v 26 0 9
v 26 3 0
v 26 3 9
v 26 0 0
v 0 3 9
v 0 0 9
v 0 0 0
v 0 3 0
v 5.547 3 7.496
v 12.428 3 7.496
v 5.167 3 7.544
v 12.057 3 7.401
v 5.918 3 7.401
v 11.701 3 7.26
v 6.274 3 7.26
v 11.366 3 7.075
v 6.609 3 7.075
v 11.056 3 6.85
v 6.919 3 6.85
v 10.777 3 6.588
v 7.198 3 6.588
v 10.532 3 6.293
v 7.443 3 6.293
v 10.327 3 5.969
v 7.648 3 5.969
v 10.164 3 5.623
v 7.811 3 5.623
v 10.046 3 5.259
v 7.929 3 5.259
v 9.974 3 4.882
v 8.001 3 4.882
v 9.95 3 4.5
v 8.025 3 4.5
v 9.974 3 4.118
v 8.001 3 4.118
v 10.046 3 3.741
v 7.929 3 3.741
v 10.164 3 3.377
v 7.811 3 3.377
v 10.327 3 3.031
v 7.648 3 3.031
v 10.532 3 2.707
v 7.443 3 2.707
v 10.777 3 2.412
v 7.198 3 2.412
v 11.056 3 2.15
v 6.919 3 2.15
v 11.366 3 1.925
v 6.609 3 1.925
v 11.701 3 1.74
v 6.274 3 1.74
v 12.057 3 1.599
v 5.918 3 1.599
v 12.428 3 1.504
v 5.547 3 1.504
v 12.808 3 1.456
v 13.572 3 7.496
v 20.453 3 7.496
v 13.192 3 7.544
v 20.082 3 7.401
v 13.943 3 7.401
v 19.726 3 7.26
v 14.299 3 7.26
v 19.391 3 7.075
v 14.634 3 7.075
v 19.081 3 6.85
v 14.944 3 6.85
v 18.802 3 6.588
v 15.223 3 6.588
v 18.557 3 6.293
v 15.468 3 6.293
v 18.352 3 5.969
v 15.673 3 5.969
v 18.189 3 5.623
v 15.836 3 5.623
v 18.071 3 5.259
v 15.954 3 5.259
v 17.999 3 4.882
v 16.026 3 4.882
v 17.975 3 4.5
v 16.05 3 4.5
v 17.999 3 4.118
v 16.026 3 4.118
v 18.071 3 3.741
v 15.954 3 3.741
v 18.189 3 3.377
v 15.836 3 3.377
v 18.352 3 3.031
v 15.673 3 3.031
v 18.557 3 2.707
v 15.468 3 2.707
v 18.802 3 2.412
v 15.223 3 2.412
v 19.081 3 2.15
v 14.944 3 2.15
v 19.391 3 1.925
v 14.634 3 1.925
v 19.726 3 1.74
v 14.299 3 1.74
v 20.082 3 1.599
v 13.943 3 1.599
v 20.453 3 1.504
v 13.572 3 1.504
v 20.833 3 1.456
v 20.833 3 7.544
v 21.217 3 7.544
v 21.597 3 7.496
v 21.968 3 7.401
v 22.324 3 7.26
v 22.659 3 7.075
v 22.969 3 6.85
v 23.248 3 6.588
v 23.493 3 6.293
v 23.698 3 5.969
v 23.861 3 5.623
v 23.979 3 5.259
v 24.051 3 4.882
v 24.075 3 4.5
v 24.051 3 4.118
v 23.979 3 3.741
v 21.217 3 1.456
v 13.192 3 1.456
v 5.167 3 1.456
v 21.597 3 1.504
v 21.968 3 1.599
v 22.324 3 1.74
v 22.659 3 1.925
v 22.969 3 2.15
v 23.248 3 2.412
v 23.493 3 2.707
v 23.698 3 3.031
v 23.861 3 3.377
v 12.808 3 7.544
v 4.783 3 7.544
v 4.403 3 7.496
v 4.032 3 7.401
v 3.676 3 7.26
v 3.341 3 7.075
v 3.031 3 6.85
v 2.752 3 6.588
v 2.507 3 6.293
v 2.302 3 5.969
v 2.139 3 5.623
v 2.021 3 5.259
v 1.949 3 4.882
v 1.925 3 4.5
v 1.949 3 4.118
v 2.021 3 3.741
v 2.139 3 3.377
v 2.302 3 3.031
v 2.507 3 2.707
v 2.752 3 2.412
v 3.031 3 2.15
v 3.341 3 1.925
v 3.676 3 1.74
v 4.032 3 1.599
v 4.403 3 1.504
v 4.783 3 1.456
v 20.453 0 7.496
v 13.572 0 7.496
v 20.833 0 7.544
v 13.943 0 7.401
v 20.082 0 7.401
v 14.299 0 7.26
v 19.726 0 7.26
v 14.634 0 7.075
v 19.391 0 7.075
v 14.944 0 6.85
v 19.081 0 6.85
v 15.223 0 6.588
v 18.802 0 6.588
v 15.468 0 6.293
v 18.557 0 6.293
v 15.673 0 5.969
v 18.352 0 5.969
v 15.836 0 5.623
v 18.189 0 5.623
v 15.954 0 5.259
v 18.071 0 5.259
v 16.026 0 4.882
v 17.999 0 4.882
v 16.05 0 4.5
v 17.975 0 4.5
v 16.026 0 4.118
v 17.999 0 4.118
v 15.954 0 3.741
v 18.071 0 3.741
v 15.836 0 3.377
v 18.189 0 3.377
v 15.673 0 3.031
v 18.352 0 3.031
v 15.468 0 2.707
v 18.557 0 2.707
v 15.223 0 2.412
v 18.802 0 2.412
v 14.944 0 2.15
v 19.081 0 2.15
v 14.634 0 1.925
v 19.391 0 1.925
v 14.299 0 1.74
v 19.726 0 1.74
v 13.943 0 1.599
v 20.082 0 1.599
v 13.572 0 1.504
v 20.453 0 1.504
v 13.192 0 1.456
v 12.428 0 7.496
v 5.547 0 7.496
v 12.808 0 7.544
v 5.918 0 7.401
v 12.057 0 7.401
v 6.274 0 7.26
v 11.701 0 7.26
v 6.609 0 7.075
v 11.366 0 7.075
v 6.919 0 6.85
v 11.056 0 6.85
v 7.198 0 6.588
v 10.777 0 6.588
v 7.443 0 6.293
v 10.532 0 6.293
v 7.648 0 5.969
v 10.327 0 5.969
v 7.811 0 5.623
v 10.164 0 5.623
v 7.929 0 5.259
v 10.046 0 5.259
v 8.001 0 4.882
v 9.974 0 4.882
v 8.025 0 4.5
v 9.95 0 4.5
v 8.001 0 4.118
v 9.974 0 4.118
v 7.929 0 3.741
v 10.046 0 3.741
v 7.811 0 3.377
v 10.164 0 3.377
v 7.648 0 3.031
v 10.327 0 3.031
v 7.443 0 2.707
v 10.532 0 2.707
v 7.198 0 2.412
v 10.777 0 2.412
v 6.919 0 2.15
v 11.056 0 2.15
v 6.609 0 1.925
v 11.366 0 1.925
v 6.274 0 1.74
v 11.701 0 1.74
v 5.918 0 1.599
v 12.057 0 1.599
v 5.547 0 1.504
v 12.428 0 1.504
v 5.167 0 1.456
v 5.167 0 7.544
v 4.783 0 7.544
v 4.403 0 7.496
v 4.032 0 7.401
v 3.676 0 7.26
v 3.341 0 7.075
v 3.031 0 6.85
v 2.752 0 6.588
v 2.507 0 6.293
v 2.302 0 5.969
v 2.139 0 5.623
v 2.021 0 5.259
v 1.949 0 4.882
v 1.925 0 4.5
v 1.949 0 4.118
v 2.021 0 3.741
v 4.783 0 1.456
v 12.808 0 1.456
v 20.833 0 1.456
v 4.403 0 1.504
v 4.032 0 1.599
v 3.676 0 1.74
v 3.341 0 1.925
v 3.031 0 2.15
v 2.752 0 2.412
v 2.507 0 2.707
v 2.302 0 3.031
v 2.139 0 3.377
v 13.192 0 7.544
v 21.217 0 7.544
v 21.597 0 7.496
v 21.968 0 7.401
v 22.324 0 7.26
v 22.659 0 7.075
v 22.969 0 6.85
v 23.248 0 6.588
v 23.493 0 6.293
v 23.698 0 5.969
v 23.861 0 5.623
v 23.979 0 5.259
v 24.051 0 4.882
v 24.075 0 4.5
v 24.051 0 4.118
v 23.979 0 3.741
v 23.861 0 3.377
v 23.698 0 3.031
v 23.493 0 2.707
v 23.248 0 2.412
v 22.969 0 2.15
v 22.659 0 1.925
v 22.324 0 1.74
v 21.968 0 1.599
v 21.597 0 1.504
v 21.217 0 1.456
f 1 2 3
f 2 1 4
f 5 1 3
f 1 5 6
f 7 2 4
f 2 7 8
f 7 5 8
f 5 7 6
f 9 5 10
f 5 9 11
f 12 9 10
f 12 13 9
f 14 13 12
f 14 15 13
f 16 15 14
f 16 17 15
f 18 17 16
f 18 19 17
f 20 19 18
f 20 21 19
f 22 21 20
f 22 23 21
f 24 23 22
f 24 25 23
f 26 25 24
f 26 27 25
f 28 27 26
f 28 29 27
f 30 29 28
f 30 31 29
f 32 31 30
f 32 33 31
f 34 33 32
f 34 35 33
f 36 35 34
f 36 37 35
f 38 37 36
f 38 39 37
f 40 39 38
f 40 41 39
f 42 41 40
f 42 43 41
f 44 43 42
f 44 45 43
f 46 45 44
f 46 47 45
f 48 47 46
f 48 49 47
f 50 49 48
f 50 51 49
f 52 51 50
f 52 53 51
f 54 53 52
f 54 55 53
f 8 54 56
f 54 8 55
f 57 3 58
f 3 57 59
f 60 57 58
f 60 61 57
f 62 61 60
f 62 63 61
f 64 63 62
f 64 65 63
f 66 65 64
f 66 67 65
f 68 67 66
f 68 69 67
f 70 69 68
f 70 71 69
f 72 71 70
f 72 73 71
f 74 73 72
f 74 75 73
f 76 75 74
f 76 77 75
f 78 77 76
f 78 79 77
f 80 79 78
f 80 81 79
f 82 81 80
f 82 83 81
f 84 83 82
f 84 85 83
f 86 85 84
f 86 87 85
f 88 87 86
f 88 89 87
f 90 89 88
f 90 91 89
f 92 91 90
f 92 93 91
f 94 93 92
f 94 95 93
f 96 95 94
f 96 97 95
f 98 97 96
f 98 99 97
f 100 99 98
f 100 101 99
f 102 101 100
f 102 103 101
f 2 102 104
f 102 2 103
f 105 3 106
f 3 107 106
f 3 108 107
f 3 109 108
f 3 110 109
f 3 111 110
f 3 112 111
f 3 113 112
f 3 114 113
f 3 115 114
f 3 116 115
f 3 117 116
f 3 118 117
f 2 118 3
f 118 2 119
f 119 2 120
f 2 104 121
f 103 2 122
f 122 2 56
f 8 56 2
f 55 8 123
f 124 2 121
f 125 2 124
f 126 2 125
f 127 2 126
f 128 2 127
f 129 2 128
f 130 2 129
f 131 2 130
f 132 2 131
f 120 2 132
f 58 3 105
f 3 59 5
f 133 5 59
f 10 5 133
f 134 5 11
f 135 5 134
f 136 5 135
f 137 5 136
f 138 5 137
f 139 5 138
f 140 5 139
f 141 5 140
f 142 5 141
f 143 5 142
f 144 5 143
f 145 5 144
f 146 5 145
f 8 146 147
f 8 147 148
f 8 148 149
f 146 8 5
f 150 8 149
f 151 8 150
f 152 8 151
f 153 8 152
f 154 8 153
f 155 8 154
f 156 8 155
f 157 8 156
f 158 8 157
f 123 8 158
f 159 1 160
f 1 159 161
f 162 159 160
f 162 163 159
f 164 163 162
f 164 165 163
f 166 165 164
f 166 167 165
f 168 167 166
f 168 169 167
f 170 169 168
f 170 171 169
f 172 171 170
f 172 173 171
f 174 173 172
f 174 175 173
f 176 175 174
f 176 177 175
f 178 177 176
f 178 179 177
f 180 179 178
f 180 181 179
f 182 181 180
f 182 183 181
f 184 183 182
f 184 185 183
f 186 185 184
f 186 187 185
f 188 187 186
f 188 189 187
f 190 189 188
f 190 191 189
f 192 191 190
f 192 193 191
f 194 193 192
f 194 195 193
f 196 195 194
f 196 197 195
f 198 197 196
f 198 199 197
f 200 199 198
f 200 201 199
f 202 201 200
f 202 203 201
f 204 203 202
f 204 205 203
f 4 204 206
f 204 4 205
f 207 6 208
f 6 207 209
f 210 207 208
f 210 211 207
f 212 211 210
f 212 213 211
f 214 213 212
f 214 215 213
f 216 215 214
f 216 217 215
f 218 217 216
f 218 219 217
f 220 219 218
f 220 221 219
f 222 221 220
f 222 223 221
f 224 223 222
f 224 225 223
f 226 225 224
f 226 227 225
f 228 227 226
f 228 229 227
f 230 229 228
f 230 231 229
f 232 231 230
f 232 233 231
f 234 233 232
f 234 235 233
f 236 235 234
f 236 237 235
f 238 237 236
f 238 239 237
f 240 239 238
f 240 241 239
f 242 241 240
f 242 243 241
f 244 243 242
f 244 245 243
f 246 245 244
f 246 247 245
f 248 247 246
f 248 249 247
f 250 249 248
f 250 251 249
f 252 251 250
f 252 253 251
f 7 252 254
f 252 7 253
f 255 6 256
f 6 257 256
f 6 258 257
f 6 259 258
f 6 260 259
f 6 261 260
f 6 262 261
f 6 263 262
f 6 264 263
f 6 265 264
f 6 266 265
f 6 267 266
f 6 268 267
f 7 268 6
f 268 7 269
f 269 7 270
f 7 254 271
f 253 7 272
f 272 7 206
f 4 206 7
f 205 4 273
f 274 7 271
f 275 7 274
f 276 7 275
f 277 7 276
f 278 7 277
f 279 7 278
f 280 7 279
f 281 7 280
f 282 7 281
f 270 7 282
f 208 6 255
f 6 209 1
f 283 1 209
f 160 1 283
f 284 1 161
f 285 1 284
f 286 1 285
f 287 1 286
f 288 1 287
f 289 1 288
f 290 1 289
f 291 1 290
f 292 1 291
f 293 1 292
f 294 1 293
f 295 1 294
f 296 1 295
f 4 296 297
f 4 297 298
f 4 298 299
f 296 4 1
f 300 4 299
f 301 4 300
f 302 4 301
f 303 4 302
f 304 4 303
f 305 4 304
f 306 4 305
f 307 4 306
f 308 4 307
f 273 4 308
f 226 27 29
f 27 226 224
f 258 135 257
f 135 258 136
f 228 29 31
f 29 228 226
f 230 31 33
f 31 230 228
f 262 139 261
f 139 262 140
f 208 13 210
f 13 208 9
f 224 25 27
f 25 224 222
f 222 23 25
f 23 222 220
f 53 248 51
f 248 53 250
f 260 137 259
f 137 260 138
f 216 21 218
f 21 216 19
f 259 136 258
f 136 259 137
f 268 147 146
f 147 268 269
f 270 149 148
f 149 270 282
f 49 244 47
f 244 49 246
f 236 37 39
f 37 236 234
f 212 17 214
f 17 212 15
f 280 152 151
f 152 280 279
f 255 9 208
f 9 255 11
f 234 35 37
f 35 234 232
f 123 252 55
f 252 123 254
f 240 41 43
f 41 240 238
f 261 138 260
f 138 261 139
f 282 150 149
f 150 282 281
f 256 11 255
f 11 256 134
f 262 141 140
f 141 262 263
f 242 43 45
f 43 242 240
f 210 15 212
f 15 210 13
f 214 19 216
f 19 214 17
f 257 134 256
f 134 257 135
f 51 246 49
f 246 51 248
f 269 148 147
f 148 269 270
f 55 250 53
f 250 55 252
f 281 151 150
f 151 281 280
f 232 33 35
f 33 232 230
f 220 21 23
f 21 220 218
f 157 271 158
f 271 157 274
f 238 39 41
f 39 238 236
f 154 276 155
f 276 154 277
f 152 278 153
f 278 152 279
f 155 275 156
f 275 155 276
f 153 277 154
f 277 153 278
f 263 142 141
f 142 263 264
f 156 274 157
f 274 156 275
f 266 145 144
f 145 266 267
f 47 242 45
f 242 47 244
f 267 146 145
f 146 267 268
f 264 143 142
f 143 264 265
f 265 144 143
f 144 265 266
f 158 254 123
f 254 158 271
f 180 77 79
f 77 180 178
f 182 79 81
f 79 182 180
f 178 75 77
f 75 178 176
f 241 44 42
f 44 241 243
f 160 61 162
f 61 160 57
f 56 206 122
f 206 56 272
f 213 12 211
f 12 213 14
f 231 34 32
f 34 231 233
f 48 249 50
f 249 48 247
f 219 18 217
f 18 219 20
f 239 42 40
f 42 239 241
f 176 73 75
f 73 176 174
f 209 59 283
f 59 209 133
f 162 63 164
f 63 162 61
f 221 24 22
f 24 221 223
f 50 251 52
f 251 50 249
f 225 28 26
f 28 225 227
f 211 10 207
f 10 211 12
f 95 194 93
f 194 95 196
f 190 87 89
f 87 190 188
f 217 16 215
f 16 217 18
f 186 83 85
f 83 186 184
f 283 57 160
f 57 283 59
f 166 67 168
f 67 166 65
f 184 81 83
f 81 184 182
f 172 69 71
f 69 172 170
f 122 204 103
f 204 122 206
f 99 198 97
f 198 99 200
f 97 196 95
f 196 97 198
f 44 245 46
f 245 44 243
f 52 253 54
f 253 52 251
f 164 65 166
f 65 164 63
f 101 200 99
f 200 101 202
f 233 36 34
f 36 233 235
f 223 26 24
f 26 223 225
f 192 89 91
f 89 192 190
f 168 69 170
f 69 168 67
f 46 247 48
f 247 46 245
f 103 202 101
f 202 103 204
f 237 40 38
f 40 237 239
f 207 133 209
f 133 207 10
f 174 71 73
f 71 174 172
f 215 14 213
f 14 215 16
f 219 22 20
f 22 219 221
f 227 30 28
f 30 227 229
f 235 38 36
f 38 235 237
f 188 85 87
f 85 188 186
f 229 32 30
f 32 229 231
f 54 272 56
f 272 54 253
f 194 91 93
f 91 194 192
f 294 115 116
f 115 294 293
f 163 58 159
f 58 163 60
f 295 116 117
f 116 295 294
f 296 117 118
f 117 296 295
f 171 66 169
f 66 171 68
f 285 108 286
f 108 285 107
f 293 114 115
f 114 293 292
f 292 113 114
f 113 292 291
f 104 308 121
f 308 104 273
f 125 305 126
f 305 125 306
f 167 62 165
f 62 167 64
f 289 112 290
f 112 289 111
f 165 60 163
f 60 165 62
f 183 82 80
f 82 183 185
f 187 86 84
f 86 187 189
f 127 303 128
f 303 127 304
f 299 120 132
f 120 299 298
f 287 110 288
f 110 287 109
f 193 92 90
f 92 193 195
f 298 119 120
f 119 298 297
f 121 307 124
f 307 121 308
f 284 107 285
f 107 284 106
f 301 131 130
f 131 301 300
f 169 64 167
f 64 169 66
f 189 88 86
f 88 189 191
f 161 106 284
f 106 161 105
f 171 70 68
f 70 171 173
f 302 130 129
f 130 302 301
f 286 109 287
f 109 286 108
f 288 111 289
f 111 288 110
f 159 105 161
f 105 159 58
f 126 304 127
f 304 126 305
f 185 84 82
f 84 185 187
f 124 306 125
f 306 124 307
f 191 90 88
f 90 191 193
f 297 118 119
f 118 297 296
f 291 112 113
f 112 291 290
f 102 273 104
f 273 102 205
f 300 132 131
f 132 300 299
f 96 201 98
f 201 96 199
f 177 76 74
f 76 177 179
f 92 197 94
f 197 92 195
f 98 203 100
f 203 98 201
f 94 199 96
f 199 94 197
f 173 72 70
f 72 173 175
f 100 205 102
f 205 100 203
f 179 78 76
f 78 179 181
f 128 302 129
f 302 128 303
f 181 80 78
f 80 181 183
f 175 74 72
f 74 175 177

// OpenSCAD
TiefeWerkstueck = 3;
BreitePfote = 26;
DurchmesserDioden = 6.1;
HoeheWerkstueck = 9;
loecher = 3;
AbstandLoecher = (BreitePfote-loecher*DurchmesserDioden)/(loecher+1);

function Abstand(n) = (n+1)*AbstandLoecher+n*DurchmesserDioden;

difference(){
    cube([BreitePfote,TiefeWerkstueck,HoeheWerkstueck]);
    translate([Abstand(0),0,0]){
        cylinder1();
    }
    translate([Abstand(1),0,0]){
        cylinder1();
    }
    translate([Abstand(2),0,0]){
        cylinder1();
    }

}

module cylinder1() {
translate([DurchmesserDioden/2,TiefeWerkstueck+1,HoeheWerkstueck/2]){
rotate([90,0,0]){
cylinder($fn = 50,TiefeWerkstueck+2,DurchmesserDioden/2,DurchmesserDioden/2);
}}}
